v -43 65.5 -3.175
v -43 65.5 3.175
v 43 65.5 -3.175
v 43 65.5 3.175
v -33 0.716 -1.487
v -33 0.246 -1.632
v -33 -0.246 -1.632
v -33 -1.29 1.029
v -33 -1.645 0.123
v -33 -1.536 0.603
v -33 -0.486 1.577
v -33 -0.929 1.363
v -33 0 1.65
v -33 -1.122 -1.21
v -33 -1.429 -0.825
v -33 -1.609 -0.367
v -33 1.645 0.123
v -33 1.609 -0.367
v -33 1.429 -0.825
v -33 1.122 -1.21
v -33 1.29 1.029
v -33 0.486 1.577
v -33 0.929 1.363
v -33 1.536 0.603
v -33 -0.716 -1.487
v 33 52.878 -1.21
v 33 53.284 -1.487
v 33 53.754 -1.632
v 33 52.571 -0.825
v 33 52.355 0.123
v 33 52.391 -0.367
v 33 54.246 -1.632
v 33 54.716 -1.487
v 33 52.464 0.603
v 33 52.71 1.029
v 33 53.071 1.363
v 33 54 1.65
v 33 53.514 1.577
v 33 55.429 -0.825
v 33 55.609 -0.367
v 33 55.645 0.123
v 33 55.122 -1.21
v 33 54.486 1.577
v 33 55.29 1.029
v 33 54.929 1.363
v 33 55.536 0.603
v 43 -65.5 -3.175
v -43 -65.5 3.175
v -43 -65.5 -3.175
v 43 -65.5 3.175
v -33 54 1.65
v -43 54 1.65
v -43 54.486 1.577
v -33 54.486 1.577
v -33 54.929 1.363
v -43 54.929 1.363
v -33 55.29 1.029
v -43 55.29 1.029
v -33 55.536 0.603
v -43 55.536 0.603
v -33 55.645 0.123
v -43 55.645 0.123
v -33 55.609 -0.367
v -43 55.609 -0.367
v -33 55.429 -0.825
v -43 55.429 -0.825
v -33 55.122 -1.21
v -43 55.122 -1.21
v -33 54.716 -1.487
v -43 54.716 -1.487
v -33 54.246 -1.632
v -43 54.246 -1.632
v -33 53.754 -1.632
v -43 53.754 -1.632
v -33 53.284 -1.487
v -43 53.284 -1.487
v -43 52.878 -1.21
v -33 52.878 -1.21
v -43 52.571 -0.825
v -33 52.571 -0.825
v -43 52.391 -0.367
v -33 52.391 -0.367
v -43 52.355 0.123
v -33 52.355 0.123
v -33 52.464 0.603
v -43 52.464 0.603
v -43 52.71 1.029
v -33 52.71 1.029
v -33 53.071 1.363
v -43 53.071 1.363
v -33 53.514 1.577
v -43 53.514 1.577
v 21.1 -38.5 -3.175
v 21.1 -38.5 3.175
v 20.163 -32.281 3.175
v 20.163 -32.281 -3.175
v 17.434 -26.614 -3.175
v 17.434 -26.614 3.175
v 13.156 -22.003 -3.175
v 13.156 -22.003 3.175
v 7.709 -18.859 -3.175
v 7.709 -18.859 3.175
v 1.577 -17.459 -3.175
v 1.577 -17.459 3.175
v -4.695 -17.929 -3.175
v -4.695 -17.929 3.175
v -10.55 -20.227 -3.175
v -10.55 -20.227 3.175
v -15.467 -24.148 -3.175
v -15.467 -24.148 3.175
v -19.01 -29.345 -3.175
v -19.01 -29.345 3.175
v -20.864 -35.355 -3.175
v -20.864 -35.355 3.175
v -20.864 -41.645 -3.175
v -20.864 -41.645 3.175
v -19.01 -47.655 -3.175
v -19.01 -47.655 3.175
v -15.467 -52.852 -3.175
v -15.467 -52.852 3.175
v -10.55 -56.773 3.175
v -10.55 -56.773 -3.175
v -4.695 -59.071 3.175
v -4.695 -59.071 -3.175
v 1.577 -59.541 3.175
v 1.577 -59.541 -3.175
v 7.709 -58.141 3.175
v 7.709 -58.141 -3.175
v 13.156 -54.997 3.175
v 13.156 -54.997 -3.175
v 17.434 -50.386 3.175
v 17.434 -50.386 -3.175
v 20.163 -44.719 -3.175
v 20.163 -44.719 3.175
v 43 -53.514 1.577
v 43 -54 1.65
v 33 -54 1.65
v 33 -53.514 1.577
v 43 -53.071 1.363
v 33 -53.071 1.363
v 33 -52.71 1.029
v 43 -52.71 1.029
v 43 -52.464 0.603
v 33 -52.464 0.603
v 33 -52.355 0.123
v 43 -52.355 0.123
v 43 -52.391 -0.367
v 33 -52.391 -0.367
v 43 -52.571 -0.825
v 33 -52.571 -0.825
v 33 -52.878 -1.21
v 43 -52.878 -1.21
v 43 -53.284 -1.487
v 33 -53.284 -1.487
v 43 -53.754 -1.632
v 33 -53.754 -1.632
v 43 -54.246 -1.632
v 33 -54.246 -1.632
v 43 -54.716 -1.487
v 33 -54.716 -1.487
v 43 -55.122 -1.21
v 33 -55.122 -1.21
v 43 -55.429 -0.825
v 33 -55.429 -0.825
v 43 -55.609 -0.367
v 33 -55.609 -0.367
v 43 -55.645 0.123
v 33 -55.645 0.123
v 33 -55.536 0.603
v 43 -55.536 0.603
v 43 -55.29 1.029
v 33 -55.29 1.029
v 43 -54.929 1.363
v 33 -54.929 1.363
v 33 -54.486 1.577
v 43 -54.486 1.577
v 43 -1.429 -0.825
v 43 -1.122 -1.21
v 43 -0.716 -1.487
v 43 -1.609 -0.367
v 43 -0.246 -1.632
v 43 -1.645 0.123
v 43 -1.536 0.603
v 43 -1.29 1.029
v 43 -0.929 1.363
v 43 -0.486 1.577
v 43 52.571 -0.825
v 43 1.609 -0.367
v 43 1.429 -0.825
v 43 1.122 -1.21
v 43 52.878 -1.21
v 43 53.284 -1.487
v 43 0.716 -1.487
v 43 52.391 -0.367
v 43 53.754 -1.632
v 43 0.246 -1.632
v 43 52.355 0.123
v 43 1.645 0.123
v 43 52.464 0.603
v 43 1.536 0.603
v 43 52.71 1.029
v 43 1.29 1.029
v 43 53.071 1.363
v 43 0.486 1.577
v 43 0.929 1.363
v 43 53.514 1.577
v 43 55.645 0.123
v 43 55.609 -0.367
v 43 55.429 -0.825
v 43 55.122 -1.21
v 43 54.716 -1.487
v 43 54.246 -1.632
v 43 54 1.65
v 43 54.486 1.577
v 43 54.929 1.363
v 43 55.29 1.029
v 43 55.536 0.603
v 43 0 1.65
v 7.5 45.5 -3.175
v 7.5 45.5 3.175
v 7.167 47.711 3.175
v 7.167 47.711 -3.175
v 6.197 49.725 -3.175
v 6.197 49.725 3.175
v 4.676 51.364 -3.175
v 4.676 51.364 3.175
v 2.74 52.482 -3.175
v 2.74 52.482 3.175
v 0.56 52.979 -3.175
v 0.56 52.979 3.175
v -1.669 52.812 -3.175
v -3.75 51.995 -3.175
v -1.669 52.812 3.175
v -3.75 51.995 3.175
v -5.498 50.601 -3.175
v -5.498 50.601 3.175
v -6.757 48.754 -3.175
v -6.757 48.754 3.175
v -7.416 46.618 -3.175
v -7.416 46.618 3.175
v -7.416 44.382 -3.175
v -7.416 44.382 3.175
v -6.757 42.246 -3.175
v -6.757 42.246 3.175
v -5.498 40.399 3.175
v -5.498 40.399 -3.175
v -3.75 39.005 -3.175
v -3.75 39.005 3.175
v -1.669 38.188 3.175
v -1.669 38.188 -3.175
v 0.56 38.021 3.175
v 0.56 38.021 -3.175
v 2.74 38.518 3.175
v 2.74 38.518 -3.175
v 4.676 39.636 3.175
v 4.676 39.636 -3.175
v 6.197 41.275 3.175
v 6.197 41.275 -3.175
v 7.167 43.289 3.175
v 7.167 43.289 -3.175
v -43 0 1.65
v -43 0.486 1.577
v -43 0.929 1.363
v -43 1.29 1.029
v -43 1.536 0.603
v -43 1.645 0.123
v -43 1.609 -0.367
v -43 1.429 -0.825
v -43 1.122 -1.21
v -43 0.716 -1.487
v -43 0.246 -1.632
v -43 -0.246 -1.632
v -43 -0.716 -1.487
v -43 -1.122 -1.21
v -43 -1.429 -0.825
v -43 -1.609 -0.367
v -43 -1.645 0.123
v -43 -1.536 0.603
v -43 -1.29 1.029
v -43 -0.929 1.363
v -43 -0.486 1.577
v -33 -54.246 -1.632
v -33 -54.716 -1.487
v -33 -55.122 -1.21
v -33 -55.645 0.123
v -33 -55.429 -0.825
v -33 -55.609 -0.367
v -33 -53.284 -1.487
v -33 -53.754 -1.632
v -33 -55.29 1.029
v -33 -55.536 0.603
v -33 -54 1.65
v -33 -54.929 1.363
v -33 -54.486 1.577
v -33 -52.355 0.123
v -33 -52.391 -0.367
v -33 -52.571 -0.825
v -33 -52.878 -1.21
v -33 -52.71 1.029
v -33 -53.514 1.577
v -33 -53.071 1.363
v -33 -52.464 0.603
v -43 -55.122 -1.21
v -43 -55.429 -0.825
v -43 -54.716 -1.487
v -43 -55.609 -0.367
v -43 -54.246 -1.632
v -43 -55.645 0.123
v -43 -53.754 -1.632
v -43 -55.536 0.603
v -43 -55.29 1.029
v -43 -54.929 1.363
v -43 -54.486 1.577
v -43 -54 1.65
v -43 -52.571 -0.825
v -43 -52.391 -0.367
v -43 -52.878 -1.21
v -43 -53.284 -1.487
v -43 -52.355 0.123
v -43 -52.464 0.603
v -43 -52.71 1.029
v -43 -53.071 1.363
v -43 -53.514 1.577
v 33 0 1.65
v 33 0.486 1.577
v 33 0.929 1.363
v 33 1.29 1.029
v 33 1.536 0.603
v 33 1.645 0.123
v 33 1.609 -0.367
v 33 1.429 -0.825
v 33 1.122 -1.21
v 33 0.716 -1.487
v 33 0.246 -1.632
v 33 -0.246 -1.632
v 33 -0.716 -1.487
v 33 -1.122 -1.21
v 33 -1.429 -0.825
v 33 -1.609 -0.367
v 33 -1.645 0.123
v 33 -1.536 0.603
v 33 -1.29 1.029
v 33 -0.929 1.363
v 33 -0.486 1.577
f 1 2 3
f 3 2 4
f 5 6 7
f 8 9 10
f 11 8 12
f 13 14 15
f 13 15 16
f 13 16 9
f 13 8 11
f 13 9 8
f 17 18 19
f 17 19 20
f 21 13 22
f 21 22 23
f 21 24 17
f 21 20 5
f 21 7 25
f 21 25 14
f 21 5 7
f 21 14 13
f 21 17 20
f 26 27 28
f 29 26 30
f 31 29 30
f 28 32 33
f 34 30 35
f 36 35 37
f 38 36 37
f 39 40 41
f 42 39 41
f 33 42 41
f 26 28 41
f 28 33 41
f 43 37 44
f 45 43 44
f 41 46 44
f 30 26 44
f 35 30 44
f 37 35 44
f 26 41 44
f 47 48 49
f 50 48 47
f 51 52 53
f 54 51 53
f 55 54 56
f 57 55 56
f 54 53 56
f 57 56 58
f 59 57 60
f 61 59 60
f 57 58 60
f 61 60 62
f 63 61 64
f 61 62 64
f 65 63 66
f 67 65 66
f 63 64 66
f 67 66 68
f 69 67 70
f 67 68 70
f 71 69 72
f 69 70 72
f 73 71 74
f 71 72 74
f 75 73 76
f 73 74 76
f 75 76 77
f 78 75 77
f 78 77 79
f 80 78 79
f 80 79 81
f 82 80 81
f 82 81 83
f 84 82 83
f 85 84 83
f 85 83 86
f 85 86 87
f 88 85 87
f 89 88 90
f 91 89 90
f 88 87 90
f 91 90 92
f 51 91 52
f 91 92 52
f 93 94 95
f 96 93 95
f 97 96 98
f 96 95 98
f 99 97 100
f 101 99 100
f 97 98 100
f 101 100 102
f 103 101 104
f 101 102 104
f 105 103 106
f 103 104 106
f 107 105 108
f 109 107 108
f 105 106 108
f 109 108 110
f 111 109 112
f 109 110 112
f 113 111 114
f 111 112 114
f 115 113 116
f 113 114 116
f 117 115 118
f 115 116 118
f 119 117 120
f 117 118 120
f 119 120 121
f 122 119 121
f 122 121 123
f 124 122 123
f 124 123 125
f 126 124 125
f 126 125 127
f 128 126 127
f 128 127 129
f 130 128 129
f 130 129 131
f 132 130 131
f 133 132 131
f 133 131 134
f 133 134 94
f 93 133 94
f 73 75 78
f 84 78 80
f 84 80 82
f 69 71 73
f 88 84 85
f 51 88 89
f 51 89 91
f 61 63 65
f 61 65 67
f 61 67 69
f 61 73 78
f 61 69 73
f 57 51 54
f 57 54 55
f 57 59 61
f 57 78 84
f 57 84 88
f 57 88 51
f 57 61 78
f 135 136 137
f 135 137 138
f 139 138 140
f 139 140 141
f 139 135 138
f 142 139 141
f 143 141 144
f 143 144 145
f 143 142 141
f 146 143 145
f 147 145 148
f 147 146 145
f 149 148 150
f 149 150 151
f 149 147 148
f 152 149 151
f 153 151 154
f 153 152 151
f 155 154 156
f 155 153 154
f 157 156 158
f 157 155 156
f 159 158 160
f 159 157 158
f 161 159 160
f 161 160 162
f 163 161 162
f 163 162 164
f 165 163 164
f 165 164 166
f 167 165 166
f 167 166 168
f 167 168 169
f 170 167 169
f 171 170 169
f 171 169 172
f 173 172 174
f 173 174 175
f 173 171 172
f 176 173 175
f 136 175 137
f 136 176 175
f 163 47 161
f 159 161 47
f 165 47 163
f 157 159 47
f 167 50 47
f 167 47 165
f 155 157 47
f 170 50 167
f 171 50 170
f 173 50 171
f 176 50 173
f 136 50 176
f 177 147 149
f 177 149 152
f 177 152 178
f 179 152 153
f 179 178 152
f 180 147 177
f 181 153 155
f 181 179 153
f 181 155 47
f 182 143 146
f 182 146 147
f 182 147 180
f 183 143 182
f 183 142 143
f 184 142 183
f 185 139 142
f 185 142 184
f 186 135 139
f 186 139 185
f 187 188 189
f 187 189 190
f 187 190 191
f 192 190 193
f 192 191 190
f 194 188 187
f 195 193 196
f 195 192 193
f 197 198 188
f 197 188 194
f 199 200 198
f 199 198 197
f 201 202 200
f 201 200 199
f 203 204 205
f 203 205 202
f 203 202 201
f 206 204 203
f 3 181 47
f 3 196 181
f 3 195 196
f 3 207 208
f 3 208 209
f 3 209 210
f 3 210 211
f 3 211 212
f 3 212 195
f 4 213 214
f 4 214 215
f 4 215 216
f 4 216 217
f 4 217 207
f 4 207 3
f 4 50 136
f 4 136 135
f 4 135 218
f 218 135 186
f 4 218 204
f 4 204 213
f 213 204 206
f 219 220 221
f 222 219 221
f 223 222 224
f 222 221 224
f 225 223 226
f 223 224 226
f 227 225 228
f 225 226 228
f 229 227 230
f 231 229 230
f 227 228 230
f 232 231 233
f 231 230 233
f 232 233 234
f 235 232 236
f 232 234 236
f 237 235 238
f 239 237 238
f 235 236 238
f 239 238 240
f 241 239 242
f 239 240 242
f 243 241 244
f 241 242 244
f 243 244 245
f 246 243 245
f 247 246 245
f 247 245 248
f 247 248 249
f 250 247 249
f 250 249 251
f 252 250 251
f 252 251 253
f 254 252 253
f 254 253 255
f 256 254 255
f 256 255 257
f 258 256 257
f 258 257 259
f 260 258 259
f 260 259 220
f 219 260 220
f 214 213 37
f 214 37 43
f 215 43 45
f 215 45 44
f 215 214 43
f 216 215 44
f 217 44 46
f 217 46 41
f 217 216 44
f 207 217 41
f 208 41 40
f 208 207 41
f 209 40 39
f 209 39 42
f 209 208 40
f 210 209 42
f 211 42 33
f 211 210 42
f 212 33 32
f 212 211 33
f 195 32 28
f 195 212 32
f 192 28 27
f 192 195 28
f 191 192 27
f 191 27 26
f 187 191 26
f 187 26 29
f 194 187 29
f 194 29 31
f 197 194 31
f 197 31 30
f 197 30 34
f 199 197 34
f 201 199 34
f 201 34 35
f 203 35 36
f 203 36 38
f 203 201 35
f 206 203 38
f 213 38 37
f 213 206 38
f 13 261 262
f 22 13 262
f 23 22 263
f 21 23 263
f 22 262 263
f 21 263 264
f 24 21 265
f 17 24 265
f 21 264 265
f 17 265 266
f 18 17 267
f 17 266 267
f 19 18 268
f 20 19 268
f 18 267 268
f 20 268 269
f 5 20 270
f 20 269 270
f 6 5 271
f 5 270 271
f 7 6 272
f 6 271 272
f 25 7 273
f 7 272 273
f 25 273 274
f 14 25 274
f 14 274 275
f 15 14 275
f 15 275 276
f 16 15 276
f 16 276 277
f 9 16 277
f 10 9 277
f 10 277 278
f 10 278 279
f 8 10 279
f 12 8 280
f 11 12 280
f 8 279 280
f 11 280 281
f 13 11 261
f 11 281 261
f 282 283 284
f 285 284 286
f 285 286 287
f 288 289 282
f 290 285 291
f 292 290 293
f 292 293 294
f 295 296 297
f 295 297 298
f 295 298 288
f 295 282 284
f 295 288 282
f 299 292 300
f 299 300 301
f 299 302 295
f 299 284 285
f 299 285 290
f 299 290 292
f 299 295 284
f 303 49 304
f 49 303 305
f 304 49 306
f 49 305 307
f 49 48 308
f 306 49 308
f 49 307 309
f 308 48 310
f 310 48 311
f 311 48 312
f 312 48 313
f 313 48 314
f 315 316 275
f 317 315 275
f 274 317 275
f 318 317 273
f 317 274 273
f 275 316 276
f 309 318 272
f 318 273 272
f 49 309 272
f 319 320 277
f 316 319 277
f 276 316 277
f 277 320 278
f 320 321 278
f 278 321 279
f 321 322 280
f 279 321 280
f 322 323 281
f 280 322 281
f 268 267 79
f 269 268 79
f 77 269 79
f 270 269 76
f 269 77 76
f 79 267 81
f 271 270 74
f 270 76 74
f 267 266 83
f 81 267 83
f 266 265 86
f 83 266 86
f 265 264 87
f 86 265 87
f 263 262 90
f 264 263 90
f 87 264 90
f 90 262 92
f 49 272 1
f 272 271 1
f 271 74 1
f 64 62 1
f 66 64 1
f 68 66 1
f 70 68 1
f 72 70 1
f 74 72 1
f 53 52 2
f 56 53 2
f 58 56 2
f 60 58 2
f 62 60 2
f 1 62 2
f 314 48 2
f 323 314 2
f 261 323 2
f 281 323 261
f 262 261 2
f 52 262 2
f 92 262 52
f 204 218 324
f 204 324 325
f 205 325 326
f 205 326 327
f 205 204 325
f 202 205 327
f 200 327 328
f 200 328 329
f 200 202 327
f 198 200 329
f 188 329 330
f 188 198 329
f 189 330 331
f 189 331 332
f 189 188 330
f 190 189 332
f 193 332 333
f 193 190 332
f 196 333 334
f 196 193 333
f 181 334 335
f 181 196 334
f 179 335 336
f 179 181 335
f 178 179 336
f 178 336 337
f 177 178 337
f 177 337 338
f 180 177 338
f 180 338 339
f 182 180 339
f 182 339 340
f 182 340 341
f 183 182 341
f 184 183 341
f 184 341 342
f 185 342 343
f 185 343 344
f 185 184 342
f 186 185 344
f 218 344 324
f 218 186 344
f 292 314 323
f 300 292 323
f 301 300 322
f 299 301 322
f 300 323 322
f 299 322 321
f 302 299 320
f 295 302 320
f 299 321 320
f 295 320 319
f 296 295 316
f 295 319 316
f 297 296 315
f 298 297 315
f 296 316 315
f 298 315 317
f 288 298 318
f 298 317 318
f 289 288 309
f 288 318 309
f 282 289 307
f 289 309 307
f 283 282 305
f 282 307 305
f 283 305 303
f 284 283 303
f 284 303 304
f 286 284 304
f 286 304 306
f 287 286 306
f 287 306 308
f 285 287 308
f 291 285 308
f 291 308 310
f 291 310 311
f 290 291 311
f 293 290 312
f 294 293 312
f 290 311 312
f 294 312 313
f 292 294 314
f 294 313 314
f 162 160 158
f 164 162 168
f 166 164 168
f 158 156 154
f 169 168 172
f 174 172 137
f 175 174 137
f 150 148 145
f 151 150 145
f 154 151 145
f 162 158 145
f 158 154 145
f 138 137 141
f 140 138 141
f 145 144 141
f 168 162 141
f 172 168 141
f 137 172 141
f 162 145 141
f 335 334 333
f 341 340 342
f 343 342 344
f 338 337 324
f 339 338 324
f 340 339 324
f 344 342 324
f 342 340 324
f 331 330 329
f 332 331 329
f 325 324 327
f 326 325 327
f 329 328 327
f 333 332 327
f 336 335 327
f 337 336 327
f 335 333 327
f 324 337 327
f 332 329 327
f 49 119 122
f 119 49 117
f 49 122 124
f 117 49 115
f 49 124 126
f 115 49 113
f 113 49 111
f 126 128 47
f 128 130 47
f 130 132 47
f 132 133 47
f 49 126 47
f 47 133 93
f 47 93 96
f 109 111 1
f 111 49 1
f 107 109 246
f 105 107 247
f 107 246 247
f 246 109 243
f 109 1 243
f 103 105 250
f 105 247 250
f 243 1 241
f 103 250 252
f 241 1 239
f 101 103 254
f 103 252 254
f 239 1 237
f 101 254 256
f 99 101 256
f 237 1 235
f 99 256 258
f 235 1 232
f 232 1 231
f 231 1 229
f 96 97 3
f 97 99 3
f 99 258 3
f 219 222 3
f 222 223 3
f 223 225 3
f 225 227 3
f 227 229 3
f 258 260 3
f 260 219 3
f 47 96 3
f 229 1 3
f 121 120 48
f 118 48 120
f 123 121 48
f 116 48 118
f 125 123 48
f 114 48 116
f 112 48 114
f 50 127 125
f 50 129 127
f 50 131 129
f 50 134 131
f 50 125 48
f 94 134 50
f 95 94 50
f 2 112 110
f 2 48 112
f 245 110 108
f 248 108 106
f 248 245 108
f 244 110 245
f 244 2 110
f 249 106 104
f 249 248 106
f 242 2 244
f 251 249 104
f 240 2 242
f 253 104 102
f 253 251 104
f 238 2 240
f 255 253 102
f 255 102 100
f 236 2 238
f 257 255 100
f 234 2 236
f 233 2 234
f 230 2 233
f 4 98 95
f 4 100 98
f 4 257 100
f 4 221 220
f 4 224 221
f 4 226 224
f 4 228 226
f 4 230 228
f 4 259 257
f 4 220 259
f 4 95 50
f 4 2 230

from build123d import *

# Parameters (mm, degrees)
SKETCH1_W           = 86
SKETCH1_H           = 131
BOSS_EXTRUDE1_DEPTH = 3.175
SKETCH2_R           = 1.65
CUT_EXTRUDE1_DEPTH  = 10
SKETCH3_R           = 7.5
CUT_EXTRUDE2_DEPTH  = 79.610256964
SKETCH4_R           = 21.1
CUT_EXTRUDE3_DEPTH  = 79.610256964


with BuildPart() as part:
    # Sketch1 → Boss-Extrude1 (new, symmetric)
    with BuildSketch(Plane.XY):
        Rectangle(SKETCH1_W, SKETCH1_H)
    extrude(amount=BOSS_EXTRUDE1_DEPTH, both=True)

    # Sketch2 → Cut-Extrude1 (cut)
    with BuildSketch(Plane.ZY.offset(43)):
        with Locations((0, 54)):
            Circle(SKETCH2_R)
        with Locations((0, -54)):
            Circle(SKETCH2_R)
        Circle(SKETCH2_R)
    cut_extrude1 = extrude(amount=-CUT_EXTRUDE1_DEPTH, mode=Mode.SUBTRACT)

    # Mirror1: Cut-Extrude1 across plane
    add(cut_extrude1.mirror(Plane(origin=(0, 0, 0), x_dir=(0, 0, 1), z_dir=(1, 0, 0))), mode=Mode.SUBTRACT)

    # Sketch3 → Cut-Extrude2 (cut, through all)
    with BuildSketch(Plane.XY.offset(3.175)):
        with Locations((0, 45.5)):
            Circle(SKETCH3_R)
    extrude(amount=-CUT_EXTRUDE2_DEPTH, mode=Mode.SUBTRACT)

    # Sketch4 → Cut-Extrude3 (cut, through all)
    with BuildSketch(Plane.XY.offset(3.175)):
        with Locations((0, -38.5)):
            Circle(SKETCH4_R)
    extrude(amount=-CUT_EXTRUDE3_DEPTH, mode=Mode.SUBTRACT)


solid = part.part
